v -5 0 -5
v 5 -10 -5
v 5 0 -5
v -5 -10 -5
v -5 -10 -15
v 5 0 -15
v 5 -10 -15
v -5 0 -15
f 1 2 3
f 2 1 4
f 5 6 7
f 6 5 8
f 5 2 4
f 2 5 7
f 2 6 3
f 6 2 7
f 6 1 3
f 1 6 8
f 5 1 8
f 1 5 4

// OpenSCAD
x = -1;
y = -10 + 5;
translate([-5, -10, -15]) {
    cube(10);
}
